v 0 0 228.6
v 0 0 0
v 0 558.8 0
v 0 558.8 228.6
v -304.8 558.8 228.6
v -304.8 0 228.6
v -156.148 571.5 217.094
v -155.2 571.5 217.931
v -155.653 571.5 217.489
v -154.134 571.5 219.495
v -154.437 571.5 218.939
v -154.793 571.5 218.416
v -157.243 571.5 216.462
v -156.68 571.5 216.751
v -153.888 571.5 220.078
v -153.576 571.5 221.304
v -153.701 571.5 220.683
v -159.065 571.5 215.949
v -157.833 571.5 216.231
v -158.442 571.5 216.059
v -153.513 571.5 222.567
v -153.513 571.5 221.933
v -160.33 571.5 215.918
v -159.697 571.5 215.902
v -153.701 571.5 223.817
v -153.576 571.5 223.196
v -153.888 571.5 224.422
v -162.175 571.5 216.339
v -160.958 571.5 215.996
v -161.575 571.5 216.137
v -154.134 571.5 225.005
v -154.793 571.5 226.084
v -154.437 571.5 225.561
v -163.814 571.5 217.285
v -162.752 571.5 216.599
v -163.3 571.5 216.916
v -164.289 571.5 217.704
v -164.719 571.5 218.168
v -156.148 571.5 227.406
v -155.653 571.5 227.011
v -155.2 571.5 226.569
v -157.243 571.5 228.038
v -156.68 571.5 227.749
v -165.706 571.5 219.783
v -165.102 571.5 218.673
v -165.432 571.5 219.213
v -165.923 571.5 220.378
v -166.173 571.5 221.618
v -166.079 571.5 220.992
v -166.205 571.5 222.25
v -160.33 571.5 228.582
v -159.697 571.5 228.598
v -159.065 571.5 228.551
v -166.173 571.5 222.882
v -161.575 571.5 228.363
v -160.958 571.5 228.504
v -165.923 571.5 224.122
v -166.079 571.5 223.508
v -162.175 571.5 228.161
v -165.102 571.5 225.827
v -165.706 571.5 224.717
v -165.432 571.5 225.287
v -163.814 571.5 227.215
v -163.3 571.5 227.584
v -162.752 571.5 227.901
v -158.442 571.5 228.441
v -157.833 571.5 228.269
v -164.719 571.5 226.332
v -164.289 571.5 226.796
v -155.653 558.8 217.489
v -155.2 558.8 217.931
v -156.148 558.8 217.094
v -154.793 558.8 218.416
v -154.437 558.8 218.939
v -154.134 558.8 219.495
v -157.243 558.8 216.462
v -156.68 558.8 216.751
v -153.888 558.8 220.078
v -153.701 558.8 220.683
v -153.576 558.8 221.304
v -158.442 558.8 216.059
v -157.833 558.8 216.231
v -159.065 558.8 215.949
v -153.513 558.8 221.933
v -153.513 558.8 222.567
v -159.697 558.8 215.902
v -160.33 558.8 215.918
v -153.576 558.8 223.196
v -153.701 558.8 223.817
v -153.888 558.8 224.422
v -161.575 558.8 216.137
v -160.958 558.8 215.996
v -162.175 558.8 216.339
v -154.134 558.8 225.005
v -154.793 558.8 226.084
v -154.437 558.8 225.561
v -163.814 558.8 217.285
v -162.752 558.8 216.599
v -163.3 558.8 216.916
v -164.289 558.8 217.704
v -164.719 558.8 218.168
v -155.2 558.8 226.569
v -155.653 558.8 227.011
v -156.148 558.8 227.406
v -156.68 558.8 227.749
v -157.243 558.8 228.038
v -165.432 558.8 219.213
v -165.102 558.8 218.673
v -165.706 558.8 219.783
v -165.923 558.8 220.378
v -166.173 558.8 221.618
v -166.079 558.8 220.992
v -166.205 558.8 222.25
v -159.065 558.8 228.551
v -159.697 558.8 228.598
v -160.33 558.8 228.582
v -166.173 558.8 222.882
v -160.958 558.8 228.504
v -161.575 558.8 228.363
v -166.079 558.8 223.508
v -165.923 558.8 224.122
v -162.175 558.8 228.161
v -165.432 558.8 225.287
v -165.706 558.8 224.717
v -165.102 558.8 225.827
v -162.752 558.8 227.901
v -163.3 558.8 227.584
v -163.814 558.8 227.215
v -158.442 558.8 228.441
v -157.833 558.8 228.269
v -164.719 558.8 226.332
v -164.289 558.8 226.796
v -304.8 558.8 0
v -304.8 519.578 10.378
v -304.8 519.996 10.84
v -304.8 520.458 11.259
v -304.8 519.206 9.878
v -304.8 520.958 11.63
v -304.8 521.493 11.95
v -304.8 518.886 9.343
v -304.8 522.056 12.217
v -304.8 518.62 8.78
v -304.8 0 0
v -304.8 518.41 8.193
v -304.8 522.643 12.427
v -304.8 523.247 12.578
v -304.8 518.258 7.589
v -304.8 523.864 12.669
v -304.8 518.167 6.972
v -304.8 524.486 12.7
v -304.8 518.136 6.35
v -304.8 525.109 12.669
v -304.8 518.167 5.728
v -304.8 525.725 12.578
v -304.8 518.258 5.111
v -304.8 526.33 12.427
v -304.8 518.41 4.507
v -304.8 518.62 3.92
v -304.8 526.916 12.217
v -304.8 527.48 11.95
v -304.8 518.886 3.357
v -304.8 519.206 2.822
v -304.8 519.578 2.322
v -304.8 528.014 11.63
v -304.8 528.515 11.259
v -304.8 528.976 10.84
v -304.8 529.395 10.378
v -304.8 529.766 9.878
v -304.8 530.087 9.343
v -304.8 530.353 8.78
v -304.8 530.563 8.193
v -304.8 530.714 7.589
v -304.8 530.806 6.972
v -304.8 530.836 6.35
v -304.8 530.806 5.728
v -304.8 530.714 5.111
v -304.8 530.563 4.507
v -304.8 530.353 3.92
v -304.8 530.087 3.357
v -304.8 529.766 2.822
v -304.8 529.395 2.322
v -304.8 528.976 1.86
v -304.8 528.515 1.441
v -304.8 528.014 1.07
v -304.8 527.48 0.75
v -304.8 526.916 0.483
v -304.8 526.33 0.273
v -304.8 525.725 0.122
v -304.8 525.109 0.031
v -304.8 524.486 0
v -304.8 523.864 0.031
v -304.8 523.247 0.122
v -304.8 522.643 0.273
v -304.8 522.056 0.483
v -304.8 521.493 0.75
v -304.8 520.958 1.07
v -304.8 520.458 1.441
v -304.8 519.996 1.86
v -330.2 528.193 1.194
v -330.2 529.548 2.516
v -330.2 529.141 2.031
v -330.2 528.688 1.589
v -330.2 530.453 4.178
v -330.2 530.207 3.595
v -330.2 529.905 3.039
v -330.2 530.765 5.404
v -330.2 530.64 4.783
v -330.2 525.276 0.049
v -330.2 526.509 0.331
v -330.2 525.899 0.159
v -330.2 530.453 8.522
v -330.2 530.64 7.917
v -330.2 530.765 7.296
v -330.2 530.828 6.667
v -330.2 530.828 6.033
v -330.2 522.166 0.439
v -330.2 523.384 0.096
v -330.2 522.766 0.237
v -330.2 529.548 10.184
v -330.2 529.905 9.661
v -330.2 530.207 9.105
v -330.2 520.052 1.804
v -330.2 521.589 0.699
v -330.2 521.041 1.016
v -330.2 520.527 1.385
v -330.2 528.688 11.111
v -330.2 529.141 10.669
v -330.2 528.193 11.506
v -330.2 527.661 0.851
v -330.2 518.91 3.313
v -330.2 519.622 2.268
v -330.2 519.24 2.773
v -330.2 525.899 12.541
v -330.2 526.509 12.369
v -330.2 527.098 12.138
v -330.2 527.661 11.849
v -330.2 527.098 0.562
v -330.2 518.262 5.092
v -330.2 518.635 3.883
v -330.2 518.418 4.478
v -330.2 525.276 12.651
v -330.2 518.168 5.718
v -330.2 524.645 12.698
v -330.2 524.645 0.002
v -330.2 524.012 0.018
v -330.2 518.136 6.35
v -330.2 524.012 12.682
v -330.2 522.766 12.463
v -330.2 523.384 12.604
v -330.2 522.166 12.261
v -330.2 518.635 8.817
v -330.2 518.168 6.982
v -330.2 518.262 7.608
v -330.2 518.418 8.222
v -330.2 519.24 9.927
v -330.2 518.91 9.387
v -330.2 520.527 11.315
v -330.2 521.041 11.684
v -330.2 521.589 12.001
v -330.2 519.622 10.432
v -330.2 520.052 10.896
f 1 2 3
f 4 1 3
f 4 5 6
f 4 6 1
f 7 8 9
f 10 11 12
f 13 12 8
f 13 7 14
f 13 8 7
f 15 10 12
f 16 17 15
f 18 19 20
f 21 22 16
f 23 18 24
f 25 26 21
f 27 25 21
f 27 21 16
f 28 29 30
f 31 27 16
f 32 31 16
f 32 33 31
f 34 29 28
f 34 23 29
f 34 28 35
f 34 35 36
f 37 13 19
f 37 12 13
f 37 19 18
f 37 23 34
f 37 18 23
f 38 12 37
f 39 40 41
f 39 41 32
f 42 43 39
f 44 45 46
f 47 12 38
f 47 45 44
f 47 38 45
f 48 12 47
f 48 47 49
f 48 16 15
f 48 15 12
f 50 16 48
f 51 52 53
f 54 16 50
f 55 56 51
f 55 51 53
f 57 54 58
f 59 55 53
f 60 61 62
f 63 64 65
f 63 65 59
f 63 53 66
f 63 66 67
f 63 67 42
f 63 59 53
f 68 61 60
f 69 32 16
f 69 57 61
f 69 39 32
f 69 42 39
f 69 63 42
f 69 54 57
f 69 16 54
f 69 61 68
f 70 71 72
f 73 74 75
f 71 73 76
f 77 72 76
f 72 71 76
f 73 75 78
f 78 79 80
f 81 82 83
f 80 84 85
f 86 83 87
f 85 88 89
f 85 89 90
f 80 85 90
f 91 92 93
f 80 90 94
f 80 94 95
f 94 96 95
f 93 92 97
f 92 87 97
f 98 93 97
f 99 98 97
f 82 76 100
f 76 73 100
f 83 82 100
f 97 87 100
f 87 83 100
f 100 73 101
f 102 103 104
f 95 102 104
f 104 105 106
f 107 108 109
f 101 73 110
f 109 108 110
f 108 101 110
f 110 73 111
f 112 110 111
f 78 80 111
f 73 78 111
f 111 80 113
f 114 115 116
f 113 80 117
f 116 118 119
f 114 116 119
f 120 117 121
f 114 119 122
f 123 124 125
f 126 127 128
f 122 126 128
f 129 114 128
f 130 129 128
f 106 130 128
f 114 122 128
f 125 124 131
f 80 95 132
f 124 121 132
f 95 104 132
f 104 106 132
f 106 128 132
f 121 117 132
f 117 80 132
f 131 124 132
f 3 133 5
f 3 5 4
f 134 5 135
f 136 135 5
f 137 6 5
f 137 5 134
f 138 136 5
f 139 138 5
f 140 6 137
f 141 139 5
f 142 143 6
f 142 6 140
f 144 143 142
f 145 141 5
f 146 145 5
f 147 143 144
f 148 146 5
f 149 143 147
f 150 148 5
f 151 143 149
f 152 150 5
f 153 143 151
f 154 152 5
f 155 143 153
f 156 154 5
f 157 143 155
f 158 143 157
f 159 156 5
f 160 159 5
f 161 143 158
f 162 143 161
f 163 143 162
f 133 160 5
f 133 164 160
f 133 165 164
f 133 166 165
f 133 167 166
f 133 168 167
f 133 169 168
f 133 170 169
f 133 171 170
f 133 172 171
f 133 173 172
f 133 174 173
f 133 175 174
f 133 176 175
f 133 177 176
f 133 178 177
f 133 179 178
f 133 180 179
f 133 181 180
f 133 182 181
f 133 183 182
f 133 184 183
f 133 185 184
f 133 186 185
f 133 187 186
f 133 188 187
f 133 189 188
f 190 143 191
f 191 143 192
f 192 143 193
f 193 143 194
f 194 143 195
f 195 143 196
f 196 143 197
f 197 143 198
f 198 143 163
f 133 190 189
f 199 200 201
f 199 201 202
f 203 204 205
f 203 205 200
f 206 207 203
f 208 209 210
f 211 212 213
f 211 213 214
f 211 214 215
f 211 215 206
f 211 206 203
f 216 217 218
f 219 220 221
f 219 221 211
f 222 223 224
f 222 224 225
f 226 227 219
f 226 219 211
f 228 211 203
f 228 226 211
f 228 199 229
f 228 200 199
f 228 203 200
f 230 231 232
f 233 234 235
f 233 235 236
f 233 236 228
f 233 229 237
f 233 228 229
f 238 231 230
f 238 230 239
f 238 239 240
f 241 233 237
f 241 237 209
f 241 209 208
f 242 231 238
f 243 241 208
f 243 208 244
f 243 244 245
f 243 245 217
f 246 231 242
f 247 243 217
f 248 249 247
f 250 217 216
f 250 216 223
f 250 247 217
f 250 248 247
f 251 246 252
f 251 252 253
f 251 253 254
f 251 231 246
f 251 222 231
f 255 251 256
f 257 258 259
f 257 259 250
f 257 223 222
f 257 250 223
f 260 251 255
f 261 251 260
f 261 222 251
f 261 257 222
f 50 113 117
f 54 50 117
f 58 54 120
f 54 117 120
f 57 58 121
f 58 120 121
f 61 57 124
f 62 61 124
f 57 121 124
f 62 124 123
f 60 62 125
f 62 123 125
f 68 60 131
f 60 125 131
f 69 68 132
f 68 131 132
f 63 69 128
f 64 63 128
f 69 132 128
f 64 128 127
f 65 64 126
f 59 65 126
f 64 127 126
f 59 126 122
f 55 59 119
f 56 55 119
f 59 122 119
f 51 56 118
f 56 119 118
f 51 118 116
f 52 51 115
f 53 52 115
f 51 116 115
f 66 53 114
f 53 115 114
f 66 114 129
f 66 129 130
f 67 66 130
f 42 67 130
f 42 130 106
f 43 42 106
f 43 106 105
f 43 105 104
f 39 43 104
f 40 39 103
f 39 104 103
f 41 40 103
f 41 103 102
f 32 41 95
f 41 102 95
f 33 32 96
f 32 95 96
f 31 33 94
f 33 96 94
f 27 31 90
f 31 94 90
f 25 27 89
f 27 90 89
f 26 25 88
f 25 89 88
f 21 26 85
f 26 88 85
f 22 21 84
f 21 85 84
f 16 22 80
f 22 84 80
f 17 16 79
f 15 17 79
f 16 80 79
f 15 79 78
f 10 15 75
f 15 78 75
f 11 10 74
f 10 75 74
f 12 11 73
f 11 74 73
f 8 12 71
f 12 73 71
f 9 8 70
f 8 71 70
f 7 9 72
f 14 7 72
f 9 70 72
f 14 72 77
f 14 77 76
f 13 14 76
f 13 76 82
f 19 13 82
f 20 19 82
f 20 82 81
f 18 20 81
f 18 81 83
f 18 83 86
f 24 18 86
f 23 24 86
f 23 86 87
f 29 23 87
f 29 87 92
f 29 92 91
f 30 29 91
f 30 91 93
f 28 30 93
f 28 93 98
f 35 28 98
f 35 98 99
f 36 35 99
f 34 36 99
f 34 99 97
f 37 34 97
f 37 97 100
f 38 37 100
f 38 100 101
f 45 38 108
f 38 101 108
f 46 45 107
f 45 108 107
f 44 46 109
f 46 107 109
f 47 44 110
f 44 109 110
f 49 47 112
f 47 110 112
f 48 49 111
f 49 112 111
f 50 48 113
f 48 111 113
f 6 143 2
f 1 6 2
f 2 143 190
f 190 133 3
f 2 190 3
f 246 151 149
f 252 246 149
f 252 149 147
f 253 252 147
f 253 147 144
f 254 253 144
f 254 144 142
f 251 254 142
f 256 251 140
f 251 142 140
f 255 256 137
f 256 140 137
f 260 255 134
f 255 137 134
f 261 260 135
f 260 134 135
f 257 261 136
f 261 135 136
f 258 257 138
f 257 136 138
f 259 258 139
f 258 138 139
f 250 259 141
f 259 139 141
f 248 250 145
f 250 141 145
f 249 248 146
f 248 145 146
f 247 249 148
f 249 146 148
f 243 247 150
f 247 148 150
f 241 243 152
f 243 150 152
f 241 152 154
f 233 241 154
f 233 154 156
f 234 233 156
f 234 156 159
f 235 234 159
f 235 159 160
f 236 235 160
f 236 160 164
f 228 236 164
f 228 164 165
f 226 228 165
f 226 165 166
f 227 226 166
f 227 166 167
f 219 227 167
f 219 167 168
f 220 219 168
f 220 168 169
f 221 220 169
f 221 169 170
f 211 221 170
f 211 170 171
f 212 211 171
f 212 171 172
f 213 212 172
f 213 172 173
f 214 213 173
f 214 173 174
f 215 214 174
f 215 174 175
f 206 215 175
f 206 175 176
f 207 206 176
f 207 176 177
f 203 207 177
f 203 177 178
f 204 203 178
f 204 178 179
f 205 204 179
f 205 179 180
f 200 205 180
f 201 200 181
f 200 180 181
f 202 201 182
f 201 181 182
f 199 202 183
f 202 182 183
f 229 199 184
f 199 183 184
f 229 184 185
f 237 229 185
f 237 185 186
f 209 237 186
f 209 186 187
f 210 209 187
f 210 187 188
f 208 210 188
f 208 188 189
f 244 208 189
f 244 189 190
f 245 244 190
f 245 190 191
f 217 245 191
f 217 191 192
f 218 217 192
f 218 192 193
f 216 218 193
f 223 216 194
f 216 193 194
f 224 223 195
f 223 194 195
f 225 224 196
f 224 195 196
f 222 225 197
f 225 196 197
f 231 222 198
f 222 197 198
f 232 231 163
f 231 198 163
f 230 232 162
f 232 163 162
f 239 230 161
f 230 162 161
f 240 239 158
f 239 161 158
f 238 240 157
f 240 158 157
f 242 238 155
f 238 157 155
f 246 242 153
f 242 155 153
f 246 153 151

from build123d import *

# Parameters (mm, degrees)
F0_W     = 304.8
F0_H     = 558.8
F1_DEPTH = 228.6
F2_R     = 6.35
F3_DEPTH = 25.4
F4_R     = 6.35
F5_DEPTH = 12.7


with BuildPart() as f1:
    # F0 (on Top) → F1 (new body)
    with BuildSketch(Plane.XY):
        with Locations((-152.4, 279.4)):
            Rectangle(F0_W, F0_H)
    extrude(amount=F1_DEPTH)

    # F2 (on face) → F3 (join)
    with BuildSketch(Plane(origin=(-304.8, 0, 0), x_dir=(0, -1, 0), z_dir=(-1, 0, 0))):
        with Locations((-524.486303, 6.35)):
            Circle(F2_R)
    extrude(amount=F3_DEPTH)


with BuildPart() as f5:
    # F4 (on face) → F5 (new body)
    with BuildSketch(Plane(origin=(0, 558.8, 0), x_dir=(-1, 0, 0), z_dir=(0, 1, 0))):
        with Locations((159.855023, 222.25)):
            Circle(F4_R)
    extrude(amount=F5_DEPTH)


solid = Compound([f1.part, f5.part])
